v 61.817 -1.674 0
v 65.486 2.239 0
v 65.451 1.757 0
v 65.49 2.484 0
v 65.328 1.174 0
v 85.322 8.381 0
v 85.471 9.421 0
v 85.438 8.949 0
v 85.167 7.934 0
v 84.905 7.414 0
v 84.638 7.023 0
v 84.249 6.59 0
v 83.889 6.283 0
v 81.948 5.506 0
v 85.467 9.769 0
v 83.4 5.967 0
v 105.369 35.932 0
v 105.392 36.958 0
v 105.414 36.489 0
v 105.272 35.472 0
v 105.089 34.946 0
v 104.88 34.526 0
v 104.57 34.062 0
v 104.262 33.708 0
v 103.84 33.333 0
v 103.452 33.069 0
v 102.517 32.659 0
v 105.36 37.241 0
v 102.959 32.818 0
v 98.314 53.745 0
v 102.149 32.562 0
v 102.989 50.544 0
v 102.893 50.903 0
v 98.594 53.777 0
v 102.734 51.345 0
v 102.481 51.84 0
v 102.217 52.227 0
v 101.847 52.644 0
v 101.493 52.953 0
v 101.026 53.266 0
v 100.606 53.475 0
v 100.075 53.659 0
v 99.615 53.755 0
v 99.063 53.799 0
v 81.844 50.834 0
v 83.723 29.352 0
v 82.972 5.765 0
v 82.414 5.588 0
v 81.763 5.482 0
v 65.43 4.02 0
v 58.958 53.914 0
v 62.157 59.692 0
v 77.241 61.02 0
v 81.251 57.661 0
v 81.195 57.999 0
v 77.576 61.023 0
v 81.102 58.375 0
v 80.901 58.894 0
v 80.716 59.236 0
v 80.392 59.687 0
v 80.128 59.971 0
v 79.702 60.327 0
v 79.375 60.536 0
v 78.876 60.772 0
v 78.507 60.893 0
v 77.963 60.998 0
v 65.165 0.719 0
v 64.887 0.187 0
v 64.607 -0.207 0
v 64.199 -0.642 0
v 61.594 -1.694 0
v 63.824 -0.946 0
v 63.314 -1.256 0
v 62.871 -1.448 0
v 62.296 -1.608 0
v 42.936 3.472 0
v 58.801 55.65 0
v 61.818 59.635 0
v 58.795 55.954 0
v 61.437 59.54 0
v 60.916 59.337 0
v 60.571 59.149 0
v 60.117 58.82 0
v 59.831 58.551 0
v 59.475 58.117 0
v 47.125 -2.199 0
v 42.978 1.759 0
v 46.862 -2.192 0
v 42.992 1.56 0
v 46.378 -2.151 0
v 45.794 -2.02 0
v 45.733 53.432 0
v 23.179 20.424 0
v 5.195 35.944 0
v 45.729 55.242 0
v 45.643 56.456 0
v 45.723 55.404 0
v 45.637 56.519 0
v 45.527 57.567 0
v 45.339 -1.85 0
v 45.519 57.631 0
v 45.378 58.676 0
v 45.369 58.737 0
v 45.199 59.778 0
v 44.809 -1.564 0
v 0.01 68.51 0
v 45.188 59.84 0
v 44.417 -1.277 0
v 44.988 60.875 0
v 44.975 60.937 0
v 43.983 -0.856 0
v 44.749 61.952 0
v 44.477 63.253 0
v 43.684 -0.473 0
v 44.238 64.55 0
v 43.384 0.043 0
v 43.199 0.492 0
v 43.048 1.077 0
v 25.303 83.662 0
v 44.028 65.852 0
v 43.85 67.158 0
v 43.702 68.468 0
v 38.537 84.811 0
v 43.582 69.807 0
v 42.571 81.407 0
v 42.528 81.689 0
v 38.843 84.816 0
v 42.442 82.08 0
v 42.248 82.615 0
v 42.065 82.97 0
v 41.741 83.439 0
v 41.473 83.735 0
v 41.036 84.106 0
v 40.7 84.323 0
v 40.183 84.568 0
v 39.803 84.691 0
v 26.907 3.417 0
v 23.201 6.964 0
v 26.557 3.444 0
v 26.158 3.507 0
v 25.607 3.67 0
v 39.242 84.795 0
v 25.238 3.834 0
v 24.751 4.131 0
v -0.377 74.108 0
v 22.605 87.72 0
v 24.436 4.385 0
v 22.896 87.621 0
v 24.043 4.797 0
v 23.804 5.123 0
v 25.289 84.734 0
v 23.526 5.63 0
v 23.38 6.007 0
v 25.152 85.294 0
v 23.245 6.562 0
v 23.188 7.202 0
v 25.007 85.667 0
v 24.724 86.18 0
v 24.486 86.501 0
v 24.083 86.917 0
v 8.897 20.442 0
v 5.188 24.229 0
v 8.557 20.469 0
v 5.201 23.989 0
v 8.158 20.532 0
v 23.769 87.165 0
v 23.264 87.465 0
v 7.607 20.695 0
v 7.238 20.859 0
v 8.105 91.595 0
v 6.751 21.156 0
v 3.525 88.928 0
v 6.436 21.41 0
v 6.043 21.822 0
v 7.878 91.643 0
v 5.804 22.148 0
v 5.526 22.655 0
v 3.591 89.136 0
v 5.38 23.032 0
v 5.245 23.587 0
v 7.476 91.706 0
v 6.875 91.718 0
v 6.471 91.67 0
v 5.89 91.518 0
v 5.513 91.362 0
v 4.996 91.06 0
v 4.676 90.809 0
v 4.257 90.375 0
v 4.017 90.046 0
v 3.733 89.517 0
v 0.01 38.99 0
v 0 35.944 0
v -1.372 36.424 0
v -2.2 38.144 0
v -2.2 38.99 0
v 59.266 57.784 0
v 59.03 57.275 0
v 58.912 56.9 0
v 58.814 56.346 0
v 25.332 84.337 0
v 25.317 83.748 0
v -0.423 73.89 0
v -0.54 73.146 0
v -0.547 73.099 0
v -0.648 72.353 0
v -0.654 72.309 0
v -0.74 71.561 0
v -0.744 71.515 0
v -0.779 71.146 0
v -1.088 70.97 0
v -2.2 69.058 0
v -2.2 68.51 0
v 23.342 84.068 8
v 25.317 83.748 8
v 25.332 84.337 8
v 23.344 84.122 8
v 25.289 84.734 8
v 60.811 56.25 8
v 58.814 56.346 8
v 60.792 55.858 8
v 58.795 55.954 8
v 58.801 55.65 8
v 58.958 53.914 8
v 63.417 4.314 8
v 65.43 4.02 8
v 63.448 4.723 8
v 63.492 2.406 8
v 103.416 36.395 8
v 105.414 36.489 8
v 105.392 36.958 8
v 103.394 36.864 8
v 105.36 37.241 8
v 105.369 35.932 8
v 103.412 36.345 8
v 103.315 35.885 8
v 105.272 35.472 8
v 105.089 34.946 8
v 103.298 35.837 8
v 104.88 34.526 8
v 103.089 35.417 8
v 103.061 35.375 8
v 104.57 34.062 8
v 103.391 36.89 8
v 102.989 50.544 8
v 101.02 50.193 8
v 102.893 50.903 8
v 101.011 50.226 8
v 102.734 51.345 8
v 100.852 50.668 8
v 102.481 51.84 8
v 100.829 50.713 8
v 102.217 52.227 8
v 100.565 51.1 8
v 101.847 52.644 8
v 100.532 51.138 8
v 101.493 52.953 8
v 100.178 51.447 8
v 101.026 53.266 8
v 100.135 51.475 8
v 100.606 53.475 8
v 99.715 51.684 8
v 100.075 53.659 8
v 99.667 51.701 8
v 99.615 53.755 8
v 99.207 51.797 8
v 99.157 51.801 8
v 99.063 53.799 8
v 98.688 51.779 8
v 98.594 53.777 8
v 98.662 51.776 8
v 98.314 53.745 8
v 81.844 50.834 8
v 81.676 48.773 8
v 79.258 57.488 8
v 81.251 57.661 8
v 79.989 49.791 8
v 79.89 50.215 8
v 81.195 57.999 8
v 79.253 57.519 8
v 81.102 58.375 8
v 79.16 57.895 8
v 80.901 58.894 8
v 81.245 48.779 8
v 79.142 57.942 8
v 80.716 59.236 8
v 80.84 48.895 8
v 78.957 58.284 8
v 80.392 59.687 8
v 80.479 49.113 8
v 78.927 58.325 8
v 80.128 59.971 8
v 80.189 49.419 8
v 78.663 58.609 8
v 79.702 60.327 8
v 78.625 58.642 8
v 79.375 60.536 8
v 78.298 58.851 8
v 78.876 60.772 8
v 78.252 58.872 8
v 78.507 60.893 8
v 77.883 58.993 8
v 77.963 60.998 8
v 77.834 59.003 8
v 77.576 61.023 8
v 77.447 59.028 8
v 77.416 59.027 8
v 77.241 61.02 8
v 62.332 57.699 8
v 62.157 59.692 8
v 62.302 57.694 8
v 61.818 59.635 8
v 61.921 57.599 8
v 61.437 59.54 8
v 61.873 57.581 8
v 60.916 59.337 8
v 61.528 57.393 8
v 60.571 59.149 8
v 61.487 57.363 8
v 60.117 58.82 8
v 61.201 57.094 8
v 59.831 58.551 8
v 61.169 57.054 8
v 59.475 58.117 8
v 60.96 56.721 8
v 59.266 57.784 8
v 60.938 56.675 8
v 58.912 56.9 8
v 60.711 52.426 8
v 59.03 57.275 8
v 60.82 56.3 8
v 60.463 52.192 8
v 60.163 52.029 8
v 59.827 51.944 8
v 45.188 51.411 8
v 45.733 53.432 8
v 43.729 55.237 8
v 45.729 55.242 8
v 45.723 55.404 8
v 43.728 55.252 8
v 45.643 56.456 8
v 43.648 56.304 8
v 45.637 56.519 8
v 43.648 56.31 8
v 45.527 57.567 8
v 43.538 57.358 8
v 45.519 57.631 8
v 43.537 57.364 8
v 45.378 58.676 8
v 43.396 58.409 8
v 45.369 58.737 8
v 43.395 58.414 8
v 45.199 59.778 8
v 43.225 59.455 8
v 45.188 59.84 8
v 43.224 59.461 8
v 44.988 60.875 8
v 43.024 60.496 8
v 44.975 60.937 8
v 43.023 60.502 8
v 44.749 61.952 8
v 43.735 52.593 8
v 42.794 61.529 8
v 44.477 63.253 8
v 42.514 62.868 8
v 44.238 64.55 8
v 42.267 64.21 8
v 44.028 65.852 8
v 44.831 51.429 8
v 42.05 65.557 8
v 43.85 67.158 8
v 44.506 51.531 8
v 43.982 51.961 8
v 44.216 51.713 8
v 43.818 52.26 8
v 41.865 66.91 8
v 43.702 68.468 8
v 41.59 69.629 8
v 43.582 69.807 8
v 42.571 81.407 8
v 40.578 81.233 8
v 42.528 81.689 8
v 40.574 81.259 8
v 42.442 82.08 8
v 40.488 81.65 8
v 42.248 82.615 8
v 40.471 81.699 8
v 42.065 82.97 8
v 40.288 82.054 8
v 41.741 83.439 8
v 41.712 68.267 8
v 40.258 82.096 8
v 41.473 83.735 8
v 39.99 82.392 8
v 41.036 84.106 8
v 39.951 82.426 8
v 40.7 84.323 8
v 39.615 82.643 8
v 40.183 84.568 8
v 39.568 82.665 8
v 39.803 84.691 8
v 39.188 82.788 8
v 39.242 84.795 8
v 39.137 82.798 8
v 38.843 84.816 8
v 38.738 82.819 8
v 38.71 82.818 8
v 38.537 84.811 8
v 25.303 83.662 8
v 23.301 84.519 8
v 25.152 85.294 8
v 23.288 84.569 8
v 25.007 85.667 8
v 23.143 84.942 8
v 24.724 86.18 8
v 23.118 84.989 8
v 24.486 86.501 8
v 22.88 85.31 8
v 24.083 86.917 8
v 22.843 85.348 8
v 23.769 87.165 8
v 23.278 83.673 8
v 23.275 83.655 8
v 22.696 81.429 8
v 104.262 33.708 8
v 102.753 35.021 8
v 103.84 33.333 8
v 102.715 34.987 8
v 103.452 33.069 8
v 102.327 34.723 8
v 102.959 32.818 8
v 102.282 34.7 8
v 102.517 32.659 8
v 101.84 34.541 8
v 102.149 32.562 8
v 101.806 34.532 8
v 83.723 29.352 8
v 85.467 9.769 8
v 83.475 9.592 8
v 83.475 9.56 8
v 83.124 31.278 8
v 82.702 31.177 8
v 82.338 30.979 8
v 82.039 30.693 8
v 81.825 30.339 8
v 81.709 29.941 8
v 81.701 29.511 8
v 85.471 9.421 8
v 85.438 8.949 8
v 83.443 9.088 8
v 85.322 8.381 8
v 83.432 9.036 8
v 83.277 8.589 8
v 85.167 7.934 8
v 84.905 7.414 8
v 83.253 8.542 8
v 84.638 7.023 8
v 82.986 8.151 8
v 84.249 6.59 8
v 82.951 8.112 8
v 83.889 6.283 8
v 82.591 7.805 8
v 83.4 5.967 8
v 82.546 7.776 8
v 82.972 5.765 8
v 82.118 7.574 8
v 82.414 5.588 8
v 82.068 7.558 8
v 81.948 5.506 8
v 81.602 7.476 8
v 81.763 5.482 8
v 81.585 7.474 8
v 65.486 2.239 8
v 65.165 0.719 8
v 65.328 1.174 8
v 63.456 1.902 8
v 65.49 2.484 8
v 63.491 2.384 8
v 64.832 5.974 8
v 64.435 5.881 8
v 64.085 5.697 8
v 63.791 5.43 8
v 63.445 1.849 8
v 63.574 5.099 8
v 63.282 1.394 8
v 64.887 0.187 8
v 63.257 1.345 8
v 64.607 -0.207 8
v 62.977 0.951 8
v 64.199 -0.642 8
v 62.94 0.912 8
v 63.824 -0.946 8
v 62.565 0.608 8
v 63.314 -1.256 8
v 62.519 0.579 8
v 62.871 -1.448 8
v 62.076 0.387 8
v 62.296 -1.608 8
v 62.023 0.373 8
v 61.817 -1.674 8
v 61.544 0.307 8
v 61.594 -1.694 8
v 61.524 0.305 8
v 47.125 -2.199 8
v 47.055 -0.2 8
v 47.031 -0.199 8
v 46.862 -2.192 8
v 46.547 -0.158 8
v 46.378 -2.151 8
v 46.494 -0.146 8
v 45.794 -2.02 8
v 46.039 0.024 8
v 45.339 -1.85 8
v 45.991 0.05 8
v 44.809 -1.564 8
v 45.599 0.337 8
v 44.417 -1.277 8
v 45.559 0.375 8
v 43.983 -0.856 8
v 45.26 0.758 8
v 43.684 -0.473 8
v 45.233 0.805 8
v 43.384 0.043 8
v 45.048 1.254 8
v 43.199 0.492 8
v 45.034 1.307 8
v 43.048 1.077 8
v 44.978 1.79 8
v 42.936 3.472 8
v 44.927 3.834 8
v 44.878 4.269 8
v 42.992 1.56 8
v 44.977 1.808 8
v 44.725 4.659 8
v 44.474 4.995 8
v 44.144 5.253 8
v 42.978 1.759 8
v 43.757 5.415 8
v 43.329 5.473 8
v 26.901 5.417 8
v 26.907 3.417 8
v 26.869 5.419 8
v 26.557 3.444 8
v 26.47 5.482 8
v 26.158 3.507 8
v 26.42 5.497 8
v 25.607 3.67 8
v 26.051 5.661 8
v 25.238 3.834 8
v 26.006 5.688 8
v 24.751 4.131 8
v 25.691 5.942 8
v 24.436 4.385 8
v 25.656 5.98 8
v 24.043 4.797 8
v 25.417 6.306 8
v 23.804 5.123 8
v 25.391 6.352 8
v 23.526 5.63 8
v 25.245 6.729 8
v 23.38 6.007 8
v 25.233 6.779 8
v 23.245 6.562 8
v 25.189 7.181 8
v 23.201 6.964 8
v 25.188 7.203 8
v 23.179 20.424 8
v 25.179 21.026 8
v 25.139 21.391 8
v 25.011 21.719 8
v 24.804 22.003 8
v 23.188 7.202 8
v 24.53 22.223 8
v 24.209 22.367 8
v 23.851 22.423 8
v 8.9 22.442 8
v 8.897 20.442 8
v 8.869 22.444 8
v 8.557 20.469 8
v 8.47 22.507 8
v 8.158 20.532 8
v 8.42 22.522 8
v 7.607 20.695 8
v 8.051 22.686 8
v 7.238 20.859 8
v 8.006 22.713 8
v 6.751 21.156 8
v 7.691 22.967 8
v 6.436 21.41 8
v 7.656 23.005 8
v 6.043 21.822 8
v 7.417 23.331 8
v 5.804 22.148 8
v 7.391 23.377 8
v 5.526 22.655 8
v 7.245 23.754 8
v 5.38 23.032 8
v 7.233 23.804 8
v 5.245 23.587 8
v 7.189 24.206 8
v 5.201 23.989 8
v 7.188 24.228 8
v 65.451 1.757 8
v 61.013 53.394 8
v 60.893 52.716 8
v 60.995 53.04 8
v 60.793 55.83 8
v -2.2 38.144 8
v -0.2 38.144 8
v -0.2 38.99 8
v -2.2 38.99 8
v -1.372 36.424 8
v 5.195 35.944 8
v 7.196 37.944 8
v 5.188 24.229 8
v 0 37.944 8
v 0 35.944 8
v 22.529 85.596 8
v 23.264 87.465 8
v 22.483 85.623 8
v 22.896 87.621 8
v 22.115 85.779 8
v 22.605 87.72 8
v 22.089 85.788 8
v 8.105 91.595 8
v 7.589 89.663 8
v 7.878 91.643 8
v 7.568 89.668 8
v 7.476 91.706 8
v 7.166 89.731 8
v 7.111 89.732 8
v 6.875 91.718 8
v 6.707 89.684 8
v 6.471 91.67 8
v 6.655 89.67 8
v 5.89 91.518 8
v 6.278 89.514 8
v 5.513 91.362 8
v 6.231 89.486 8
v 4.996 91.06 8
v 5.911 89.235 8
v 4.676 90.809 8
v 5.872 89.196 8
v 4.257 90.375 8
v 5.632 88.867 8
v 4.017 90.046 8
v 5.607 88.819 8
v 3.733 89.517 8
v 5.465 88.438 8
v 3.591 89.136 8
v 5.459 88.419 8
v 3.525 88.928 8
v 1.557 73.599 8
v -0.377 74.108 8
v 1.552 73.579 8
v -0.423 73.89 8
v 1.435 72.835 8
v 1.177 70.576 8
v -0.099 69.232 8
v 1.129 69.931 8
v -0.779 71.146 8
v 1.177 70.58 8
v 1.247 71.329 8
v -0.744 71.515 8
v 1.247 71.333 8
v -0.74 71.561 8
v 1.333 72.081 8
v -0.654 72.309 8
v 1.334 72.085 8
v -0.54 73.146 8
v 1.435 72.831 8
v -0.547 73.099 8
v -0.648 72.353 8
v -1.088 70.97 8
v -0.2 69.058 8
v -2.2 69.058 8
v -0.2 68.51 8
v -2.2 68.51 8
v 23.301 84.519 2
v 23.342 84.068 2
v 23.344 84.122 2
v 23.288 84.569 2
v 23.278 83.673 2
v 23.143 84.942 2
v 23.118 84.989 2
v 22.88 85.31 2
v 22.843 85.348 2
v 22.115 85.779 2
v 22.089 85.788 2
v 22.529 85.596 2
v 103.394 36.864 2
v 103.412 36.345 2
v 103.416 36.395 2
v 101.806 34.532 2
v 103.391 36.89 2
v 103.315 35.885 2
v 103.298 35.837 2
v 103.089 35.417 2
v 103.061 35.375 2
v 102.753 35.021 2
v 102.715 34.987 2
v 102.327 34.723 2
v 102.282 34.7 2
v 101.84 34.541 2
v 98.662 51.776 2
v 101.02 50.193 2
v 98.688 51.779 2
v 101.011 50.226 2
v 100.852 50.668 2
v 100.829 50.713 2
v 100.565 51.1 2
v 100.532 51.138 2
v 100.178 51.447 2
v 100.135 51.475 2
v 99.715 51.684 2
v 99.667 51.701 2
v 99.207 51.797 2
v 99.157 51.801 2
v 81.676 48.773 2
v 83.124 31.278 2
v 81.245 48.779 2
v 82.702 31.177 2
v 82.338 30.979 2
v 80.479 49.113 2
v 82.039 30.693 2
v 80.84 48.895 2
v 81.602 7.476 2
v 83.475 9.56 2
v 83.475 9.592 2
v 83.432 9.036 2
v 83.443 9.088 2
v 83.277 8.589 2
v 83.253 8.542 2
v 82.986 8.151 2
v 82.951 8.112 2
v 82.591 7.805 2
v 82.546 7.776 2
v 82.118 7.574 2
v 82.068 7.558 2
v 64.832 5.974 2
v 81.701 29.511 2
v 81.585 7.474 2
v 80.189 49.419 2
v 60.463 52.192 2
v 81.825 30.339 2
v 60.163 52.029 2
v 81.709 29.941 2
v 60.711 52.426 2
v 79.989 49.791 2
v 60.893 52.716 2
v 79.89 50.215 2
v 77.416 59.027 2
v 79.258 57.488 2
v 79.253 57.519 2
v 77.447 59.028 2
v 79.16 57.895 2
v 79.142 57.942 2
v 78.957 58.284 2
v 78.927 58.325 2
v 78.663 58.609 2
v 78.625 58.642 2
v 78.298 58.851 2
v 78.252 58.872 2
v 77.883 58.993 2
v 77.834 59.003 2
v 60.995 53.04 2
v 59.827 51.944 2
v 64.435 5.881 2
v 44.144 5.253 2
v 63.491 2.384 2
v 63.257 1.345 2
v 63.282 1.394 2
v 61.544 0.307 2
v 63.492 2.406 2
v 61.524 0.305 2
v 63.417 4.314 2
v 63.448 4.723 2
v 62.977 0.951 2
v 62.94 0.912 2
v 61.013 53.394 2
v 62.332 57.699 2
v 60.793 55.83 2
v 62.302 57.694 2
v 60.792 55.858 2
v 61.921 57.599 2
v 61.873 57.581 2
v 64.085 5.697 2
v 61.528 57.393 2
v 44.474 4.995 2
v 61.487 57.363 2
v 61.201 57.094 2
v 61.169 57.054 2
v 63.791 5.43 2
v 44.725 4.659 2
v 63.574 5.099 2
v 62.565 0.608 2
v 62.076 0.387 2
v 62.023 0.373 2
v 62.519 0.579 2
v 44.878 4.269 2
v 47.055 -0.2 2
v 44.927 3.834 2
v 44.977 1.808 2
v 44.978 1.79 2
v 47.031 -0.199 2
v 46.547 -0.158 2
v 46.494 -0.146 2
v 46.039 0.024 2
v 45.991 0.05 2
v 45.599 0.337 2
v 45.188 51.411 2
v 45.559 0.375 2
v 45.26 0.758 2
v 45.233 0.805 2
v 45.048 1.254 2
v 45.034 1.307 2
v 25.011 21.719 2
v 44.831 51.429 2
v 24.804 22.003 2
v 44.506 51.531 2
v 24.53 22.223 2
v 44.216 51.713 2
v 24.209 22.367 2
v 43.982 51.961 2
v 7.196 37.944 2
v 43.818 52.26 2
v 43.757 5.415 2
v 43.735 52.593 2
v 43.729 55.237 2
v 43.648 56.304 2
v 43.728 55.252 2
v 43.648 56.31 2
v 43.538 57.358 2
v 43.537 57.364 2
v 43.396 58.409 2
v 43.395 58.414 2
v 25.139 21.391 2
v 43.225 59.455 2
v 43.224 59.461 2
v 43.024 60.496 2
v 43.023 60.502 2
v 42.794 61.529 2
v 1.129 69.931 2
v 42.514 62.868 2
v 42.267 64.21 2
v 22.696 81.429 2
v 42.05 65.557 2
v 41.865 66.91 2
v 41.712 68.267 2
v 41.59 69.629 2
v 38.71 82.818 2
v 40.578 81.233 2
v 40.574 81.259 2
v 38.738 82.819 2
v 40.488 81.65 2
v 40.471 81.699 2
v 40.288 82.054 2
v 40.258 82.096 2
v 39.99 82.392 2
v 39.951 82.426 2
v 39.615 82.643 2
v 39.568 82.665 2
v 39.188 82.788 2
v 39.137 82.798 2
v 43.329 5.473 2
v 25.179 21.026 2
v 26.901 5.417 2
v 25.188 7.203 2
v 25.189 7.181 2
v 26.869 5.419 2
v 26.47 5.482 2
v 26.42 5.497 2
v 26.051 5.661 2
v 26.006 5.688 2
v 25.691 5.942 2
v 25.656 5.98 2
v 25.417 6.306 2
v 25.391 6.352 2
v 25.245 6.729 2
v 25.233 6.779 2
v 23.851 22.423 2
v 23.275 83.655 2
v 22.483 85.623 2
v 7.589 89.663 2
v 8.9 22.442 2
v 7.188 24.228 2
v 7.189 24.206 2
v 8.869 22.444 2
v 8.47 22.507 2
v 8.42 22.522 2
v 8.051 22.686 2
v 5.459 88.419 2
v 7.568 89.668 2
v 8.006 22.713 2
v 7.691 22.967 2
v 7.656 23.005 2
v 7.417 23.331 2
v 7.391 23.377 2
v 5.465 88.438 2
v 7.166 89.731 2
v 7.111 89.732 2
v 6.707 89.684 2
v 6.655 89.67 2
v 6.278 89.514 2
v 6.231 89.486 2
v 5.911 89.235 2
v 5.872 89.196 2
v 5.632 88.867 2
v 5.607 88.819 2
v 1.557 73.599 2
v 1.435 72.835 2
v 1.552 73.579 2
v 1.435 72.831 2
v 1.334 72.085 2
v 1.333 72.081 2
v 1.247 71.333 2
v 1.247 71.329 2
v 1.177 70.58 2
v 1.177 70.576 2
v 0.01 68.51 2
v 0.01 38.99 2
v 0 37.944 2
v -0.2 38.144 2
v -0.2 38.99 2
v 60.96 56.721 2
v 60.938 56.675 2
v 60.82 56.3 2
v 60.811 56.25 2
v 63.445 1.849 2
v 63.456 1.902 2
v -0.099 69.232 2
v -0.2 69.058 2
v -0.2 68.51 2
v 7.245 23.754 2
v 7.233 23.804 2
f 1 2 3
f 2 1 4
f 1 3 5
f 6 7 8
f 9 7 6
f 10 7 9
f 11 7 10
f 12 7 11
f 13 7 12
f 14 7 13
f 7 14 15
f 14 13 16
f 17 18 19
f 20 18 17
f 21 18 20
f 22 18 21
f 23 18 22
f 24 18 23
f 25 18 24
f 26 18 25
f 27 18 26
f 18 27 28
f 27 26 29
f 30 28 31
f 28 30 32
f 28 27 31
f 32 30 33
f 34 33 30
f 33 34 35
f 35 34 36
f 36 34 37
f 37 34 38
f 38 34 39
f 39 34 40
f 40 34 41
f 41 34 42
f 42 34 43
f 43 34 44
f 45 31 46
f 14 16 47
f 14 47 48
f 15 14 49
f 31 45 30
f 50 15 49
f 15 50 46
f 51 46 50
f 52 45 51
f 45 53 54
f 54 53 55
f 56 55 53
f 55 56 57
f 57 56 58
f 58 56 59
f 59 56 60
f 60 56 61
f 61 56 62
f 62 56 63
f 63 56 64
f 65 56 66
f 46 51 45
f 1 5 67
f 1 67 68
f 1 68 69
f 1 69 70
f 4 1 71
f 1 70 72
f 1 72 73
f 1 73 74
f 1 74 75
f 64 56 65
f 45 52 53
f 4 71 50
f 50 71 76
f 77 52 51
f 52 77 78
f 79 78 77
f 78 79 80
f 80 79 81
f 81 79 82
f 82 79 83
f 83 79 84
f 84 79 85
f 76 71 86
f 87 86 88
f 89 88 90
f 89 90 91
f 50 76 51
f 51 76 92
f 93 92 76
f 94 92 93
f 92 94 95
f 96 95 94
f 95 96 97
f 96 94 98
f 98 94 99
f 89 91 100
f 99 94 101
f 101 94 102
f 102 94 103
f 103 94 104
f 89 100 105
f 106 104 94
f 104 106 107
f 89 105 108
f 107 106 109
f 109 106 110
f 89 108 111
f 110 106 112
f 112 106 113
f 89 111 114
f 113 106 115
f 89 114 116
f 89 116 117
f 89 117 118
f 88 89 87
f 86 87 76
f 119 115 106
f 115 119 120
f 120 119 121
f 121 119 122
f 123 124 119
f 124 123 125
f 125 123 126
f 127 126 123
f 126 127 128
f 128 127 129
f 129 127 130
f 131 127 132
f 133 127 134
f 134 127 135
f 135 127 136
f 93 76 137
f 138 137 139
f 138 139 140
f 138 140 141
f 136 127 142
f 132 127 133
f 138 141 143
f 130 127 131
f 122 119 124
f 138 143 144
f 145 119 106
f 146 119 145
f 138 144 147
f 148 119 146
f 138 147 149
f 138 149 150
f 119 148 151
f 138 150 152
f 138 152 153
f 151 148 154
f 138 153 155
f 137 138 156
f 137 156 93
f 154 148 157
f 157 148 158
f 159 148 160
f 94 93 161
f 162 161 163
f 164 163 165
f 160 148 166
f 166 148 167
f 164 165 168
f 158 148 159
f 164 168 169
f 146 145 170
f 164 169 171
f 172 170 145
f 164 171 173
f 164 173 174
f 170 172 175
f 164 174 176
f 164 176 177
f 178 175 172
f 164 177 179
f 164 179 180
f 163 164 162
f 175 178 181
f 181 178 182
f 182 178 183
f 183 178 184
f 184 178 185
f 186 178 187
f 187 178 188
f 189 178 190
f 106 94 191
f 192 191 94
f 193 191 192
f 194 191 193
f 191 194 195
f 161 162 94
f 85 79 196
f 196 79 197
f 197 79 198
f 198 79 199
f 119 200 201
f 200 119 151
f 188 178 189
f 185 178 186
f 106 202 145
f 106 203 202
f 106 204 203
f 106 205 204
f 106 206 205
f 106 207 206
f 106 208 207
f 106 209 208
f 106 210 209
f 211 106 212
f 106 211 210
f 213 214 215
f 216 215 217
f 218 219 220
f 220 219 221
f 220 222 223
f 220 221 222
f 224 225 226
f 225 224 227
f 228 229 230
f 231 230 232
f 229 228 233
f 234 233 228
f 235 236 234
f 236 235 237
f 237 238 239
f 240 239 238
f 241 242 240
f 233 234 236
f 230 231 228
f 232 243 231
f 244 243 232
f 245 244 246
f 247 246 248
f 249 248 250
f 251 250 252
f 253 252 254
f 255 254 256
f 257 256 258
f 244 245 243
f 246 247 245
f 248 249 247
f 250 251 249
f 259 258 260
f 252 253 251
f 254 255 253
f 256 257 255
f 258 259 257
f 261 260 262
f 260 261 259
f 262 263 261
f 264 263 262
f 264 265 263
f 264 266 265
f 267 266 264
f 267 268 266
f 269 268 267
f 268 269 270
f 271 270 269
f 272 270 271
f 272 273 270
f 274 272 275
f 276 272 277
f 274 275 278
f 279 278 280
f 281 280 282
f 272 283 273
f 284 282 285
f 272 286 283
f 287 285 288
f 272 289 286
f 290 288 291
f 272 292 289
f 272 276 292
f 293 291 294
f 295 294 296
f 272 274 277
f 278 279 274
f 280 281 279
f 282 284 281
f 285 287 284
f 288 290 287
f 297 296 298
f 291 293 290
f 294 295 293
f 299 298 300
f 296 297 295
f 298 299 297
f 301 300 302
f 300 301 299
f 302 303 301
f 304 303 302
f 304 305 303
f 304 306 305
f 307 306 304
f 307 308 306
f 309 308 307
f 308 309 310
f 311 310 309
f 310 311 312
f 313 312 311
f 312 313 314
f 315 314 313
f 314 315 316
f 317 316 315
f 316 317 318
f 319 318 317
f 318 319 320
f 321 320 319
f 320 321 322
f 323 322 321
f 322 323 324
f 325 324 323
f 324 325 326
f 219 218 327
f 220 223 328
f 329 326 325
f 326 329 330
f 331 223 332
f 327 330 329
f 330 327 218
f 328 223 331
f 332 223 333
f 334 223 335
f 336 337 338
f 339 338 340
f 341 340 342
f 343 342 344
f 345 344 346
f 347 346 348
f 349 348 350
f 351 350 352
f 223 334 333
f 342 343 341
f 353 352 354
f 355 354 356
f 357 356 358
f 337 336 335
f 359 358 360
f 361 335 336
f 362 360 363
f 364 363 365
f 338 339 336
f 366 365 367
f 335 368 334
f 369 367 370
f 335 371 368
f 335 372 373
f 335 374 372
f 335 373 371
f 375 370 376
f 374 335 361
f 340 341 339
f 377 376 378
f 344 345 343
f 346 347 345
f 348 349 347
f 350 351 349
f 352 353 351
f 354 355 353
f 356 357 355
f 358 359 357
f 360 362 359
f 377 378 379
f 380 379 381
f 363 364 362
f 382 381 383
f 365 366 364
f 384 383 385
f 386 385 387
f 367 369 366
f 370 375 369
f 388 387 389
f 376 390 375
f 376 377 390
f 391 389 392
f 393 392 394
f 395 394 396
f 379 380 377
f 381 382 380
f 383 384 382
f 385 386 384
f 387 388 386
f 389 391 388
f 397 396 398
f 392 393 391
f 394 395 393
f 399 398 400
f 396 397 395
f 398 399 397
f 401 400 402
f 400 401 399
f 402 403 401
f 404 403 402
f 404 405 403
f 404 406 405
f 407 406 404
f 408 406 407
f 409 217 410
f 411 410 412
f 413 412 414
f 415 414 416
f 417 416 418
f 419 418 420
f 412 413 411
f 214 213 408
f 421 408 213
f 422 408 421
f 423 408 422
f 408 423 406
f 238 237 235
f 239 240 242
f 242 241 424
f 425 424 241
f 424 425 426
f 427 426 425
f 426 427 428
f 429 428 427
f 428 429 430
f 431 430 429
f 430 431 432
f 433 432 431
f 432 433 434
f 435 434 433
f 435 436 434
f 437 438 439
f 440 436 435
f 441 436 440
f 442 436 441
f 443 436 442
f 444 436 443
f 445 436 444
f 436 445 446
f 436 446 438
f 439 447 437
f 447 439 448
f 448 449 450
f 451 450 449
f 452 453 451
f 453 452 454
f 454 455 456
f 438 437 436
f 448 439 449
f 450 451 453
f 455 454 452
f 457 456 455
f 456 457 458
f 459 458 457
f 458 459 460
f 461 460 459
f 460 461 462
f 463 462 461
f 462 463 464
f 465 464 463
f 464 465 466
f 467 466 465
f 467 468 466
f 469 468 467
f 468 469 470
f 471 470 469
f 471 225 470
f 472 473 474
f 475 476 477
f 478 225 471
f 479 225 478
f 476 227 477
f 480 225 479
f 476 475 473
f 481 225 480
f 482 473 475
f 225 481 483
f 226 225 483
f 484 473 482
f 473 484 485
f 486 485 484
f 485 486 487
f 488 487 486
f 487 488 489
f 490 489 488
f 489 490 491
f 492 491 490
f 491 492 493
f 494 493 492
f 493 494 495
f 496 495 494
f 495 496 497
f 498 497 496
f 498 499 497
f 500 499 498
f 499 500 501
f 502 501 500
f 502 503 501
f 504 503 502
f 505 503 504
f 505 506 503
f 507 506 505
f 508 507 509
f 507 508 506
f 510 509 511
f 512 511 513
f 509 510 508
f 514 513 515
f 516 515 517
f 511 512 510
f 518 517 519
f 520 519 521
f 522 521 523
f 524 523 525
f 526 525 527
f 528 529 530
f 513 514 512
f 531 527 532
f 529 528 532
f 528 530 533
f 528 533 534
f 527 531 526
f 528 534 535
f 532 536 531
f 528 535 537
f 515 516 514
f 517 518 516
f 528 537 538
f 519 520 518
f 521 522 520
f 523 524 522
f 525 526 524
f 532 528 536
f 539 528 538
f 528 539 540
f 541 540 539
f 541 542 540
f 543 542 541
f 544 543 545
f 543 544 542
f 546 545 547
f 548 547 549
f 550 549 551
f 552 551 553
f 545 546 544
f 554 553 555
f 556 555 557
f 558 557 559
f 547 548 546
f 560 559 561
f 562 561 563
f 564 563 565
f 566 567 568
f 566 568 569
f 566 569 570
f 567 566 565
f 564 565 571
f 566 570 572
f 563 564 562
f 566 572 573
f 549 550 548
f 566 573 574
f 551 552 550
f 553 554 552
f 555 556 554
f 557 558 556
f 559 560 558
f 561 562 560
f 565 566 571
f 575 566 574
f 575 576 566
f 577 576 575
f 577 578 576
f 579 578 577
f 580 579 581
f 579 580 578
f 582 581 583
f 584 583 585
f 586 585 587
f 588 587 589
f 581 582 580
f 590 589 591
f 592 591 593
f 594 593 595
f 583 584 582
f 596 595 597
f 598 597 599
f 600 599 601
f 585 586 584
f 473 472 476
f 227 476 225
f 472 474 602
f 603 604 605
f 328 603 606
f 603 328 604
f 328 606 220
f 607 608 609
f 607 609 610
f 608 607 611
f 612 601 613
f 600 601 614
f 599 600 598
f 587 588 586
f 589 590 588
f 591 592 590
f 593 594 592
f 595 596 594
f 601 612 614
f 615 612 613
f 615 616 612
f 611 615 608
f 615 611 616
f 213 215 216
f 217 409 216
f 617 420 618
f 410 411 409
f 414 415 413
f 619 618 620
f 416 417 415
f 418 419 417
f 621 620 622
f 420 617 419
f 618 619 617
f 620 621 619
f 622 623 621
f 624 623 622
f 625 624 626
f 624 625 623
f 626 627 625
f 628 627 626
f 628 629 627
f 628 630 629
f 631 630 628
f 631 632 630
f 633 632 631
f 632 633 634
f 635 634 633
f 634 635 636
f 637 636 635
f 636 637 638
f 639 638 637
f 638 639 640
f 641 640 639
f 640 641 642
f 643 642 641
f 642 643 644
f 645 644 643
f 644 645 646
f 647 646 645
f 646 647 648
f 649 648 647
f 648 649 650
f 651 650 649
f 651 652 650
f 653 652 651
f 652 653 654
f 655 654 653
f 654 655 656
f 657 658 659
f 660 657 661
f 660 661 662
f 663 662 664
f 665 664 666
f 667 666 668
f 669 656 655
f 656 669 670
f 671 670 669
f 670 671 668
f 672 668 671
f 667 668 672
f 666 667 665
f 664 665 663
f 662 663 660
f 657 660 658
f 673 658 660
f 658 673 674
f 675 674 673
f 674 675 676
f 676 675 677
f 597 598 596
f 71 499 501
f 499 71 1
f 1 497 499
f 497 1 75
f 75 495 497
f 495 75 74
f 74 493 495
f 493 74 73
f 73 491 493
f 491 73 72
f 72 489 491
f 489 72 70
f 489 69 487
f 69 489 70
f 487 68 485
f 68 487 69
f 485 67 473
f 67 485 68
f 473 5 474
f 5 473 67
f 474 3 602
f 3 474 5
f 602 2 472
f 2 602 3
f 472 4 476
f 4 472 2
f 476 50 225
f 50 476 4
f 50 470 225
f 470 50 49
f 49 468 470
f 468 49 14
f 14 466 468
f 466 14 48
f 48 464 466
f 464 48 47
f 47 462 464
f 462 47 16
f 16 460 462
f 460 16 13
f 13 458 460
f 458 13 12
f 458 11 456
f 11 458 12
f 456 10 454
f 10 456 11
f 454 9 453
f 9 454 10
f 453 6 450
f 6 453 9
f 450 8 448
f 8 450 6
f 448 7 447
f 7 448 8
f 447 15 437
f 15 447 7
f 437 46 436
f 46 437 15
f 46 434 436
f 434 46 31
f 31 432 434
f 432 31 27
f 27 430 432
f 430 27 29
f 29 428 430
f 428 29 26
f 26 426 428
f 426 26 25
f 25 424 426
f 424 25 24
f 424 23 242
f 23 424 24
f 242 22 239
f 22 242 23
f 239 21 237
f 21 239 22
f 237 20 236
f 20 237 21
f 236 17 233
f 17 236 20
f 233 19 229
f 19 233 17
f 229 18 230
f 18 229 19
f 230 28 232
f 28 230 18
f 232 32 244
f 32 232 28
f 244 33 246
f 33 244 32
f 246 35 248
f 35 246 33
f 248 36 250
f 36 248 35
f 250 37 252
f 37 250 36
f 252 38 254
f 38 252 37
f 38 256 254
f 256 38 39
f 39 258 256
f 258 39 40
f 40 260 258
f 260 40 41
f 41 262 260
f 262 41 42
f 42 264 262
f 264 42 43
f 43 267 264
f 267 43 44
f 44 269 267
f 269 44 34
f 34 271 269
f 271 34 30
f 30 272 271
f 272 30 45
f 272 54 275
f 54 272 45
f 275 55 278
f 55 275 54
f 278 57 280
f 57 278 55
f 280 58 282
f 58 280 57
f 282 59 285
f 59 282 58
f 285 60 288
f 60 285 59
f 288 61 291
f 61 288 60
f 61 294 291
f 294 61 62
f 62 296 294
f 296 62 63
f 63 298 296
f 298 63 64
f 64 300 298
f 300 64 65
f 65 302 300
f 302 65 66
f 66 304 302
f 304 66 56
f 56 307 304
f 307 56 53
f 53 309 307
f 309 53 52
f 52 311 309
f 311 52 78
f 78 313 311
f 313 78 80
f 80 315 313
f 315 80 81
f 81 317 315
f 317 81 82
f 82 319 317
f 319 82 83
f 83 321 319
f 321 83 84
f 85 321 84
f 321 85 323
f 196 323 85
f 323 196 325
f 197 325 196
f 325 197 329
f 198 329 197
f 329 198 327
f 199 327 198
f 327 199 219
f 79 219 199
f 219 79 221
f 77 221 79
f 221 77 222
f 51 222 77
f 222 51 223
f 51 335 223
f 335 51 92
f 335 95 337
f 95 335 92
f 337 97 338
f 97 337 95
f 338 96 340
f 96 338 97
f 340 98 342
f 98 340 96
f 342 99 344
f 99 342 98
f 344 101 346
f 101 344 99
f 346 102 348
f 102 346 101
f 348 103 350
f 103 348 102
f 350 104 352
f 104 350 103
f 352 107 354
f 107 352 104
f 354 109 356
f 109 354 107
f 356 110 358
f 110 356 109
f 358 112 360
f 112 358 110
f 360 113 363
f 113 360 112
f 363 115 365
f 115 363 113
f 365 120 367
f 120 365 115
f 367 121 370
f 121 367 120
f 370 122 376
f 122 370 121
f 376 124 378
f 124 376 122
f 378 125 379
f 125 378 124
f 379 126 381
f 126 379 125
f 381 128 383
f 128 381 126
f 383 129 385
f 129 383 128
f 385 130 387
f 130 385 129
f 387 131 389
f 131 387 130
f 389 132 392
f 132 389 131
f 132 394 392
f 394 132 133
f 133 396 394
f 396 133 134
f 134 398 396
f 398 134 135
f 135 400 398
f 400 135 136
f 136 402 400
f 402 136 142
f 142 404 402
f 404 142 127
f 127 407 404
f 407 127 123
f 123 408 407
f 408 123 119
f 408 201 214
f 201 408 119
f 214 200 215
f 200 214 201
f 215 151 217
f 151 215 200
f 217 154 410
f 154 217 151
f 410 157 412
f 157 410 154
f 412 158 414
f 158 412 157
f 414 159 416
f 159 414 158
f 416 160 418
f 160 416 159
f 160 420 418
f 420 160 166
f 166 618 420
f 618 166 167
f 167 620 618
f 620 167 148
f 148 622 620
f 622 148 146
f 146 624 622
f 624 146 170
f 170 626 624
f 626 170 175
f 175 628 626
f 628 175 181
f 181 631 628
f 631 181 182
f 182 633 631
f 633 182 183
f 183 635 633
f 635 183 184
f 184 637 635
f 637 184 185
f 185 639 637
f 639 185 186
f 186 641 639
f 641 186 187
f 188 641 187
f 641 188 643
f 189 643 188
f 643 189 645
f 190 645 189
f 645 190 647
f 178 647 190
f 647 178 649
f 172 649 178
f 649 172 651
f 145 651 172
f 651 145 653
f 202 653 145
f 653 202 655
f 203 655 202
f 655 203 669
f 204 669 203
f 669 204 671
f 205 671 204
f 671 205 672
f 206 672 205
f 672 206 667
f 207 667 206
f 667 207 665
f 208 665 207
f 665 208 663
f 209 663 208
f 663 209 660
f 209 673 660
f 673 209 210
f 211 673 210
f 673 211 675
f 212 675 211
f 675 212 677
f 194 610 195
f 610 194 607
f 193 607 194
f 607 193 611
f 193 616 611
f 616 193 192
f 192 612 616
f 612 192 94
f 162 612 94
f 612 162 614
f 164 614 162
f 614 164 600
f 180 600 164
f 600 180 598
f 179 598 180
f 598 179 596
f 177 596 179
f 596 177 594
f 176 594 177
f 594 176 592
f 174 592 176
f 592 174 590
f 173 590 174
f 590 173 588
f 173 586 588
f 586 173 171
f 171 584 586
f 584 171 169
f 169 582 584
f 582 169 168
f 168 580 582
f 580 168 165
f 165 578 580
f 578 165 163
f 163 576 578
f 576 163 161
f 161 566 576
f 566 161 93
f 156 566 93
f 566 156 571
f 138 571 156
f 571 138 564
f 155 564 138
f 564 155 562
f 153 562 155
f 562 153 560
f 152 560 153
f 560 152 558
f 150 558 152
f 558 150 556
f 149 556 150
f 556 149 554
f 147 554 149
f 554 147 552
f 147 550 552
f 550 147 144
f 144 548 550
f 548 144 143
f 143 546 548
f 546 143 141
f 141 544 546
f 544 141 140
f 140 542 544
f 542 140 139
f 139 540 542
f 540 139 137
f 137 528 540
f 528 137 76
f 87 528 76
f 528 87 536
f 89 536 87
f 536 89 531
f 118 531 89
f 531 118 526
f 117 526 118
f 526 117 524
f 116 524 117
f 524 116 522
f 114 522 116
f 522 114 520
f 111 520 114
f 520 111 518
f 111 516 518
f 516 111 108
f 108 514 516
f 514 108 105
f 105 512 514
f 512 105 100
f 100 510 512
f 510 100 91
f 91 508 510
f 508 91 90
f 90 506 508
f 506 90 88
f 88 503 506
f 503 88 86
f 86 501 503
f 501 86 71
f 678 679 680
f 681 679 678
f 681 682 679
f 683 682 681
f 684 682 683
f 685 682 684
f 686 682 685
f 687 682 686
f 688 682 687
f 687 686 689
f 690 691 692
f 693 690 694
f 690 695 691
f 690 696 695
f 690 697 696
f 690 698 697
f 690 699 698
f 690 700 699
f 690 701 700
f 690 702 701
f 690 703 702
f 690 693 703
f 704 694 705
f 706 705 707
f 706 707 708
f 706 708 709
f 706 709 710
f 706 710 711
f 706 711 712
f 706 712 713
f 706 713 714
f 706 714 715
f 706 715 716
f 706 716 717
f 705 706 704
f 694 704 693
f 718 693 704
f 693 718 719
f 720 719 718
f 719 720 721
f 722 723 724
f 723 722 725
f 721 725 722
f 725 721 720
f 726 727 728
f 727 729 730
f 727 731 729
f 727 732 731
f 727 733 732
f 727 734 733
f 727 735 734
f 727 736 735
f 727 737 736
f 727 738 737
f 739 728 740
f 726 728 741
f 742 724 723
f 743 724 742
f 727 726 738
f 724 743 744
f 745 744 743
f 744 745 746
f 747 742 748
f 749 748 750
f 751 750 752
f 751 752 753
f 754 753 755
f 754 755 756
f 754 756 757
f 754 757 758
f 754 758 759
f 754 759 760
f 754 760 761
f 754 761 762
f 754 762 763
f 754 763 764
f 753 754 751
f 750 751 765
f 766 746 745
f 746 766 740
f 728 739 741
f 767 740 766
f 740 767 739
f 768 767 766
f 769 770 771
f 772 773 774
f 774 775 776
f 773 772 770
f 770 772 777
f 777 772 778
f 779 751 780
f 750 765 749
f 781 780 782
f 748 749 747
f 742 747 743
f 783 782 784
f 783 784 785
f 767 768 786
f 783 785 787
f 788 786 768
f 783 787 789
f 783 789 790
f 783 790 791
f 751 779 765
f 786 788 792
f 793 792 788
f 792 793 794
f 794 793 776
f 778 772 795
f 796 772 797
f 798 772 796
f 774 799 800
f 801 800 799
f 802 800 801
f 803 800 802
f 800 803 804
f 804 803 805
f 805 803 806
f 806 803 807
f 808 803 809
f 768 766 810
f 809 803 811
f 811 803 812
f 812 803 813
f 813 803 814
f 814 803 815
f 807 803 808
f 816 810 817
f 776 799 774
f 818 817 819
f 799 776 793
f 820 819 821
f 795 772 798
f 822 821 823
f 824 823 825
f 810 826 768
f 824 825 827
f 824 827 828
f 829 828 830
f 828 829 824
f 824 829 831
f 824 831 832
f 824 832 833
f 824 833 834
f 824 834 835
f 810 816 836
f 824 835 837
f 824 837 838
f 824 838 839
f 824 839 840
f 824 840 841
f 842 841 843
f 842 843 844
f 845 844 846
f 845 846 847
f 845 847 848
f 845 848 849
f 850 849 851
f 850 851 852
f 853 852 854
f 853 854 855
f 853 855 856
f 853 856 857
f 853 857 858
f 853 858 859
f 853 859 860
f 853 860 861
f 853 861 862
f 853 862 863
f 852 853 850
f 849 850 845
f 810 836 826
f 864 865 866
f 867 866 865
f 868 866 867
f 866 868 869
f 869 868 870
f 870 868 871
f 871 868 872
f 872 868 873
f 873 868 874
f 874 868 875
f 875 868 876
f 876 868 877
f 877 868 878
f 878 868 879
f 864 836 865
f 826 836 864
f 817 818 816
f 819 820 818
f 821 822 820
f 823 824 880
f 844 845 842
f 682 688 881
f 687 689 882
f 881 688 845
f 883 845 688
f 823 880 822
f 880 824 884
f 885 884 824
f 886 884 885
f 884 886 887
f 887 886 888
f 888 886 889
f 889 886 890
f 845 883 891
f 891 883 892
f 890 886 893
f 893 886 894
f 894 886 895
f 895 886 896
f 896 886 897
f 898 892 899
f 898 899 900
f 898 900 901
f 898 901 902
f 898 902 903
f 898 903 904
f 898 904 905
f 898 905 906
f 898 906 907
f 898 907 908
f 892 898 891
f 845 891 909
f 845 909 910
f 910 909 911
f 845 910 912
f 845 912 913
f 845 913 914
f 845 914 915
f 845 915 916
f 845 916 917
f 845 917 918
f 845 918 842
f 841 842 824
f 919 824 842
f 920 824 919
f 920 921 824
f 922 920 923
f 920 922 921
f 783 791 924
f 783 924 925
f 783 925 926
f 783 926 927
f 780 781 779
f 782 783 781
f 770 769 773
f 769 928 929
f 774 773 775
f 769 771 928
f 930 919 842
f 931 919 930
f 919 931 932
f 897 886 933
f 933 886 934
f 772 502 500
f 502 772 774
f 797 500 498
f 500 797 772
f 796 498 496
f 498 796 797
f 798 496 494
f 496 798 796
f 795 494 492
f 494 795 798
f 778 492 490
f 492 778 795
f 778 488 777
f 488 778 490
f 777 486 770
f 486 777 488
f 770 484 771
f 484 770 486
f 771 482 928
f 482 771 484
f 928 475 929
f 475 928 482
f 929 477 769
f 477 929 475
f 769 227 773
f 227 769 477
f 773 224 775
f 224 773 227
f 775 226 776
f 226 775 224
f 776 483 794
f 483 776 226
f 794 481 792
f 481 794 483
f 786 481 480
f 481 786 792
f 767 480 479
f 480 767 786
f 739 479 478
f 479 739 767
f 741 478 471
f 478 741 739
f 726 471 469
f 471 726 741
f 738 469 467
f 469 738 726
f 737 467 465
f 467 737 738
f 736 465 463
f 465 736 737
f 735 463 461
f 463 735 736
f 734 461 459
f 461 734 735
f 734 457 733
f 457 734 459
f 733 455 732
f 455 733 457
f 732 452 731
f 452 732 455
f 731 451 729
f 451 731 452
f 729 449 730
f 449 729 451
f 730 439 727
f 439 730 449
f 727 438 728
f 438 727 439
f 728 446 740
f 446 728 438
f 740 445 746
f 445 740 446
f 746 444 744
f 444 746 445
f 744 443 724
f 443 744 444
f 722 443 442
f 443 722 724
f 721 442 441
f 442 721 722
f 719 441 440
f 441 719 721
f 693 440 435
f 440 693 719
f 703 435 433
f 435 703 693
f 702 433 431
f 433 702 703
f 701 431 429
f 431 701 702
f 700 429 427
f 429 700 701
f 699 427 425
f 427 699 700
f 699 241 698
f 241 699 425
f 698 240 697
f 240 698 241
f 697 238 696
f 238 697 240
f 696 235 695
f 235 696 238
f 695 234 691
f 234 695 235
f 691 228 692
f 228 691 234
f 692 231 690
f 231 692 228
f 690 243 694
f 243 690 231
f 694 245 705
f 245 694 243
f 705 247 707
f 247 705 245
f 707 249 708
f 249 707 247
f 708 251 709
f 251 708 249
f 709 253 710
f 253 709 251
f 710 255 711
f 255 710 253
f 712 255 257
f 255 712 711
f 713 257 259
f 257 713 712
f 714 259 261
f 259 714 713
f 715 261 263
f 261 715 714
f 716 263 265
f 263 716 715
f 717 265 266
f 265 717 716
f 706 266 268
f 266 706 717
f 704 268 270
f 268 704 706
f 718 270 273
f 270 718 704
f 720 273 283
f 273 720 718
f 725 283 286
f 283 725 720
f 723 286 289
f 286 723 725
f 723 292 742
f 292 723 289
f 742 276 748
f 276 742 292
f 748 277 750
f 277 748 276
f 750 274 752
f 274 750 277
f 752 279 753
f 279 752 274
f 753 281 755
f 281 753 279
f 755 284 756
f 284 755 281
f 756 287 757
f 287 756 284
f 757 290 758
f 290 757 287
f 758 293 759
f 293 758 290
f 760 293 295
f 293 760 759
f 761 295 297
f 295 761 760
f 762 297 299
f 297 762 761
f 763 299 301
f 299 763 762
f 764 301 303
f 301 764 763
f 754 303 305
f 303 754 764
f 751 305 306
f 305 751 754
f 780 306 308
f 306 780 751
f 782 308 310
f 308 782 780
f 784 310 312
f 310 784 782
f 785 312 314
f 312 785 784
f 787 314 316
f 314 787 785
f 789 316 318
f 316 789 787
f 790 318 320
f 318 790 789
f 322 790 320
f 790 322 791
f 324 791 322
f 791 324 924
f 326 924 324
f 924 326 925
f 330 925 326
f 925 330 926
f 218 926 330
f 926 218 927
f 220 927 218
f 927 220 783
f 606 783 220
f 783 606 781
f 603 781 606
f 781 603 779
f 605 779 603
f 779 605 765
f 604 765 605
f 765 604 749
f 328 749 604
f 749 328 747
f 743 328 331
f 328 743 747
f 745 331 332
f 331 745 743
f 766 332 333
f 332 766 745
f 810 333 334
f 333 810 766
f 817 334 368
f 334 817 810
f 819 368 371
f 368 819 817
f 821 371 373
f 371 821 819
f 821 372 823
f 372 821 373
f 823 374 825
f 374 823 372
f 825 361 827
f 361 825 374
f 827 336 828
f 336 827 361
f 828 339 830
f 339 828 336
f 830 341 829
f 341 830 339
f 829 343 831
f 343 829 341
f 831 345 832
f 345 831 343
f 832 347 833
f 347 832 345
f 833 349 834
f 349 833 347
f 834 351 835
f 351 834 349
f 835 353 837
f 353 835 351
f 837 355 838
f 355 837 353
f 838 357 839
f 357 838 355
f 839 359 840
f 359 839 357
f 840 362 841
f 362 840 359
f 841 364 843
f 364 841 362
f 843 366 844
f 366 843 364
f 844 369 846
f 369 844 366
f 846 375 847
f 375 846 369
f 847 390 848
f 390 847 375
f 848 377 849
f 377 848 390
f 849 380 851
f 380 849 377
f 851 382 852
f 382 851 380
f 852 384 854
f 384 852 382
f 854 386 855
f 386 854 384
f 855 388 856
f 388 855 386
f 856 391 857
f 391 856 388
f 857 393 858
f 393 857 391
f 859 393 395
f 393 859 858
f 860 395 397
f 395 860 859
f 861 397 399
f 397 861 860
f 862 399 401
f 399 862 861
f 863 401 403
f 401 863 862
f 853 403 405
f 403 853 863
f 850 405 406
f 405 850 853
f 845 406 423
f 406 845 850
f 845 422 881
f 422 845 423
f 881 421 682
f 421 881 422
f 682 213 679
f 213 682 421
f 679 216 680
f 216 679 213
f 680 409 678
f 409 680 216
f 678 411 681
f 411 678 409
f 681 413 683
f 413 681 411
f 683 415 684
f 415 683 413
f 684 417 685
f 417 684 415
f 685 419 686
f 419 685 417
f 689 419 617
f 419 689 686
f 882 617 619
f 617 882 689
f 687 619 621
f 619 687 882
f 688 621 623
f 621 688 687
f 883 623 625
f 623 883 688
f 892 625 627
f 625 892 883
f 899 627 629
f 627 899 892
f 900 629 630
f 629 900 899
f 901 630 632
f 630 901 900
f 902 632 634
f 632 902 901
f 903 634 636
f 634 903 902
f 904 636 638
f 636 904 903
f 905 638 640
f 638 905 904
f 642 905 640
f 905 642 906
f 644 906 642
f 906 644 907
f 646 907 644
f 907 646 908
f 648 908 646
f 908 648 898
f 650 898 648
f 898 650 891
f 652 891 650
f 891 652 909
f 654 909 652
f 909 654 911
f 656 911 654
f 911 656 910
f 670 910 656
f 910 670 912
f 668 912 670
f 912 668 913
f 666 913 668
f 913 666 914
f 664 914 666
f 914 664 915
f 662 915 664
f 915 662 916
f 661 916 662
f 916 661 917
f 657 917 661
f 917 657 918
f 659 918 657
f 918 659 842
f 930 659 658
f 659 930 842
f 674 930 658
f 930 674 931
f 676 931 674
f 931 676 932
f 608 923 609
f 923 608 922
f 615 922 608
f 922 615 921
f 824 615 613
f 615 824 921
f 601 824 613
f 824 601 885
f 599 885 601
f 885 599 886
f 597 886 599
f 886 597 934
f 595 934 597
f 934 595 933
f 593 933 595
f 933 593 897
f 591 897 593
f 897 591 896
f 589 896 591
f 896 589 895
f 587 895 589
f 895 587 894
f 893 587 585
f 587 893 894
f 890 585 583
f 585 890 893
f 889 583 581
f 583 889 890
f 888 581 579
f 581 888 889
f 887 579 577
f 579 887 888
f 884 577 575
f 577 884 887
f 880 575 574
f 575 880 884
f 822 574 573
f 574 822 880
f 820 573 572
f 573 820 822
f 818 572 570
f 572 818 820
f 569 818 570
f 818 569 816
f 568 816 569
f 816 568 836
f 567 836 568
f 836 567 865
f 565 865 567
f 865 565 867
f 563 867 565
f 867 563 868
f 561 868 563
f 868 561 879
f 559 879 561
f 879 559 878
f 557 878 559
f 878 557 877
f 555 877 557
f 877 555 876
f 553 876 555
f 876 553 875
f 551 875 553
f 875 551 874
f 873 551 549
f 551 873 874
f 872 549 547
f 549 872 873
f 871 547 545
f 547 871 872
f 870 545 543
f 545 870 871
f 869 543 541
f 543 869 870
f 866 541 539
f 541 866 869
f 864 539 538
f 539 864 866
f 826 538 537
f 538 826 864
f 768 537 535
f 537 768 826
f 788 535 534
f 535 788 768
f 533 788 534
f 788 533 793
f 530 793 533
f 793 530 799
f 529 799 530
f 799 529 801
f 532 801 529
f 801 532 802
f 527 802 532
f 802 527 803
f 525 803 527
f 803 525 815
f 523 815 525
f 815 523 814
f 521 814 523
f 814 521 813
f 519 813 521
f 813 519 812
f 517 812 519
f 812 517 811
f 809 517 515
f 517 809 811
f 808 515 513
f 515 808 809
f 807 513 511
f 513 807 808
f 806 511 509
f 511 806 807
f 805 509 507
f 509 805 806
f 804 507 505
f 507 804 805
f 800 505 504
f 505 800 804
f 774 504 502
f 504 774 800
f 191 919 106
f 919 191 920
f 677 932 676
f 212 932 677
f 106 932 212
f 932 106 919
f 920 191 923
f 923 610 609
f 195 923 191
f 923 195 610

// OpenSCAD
// file: ../common.scad
// Smallcat Keyboard Case - Common Parameters and Modules
// Shared code for all case variants

// Parameters
wall_thickness = 2;        // Wall thickness in mm
case_depth = 8;            // Total case depth in mm
pcb_thickness = 1.6;       // PCB thickness in mm
pcb_clearance = 0.2;       // Clearance around PCB in mm
bottom_thickness = 2;      // Bottom plate thickness in mm

// Main case module - takes PCB outline, cutout passed as children()
module case_bottom(pcb_outline) {
    difference() {
        // Outer shell
        linear_extrude(height=case_depth)
            offset(r=wall_thickness + pcb_clearance)
                polygon(pcb_outline);

        // Inner cavity for PCB
        translate([0, 0, bottom_thickness])
            linear_extrude(height=case_depth)
                offset(r=pcb_clearance)
                    polygon(pcb_outline);

        // Cutout geometry passed as children
        children();
    }
}
// file: common.scad
// Smallcat Split Keyboard Case - Common Parameters and Modules
// Shared code for split case variants

include <../common.scad>

// Connector edge cutout parameters
connector_cutout_start = 39;   // Y start position
connector_cutout_end = 68.5;   // Y end position

// PCB dimensions
pcb_max_x = 103.216;

// Mirror points across X axis
function mirror_x(points, max_x) = [for (p = points) [max_x - p[0], p[1]]];

// Left half PCB outline (right half is mirrored from this)
left_pcb_outline = [
    [103.194, 36.855],
    [103.216, 36.386],
    [103.119, 35.926],
    [102.910, 35.506],
    [102.602, 35.152],
    [102.214, 34.888],
    [101.772, 34.729],
    [83.084, 31.474],
    [82.630, 31.365],
    [82.219, 31.142],
    [81.882, 30.819],
    [81.640, 30.420],
    [81.510, 29.971],
    [81.501, 29.504],
    [83.276, 9.574],
    [83.243, 9.102],
    [83.088, 8.655],
    [82.821, 8.264],
    [82.461, 7.957],
    [82.033, 7.755],
    [81.567, 7.673],
    [64.800, 6.172],
    [64.365, 6.070],
    [63.969, 5.862],
    [63.638, 5.561],
    [63.393, 5.187],
    [63.250, 4.763],
    [63.217, 4.317],
    [63.292, 2.398],
    [63.257, 1.916],
    [63.094, 1.461],
    [62.814, 1.067],
    [62.439, 0.763],
    [61.996, 0.571],
    [61.517, 0.505],
    [47.048, 0.000],
    [46.564, 0.041],
    [46.109, 0.211],
    [45.717, 0.498],
    [45.418, 0.881],
    [45.233, 1.330],
    [45.177, 1.813],
    [45.127, 3.848],
    [45.074, 4.318],
    [44.901, 4.757],
    [44.618, 5.136],
    [44.246, 5.427],
    [43.810, 5.610],
    [43.342, 5.673],
    [26.900, 5.617],
    [26.501, 5.680],
    [26.132, 5.844],
    [25.817, 6.098],
    [25.578, 6.424],
    [25.432, 6.801],
    [25.388, 7.203],
    [25.379, 21.037],
    [25.335, 21.439],
    [25.188, 21.816],
    [24.950, 22.142],
    [24.635, 22.395],
    [24.266, 22.560],
    [23.867, 22.623],
    [8.900, 22.642],
    [8.501, 22.705],
    [8.132, 22.869],
    [7.817, 23.123],
    [7.578, 23.449],
    [7.432, 23.826],
    [7.388, 24.228],
    [7.396, 38.144],
    [0.000, 38.144],
    [0.000, 69.058],
    [1.321, 69.810],
    [1.376, 70.561],
    [1.446, 71.310],
    [1.532, 72.058],
    [1.633, 72.804],
    [1.750, 73.548],
    [5.652, 88.368],
    [5.794, 88.749],
    [6.034, 89.078],
    [6.354, 89.329],
    [6.731, 89.485],
    [7.135, 89.533],
    [7.537, 89.470],
    [22.037, 85.595],
    [22.405, 85.439],
    [22.719, 85.191],
    [22.957, 84.870],
    [23.102, 84.497],
    [23.145, 84.100],
    [23.081, 83.705],
    [22.431, 81.205],
    [38.727, 82.619],
    [39.126, 82.598],
    [39.506, 82.475],
    [39.842, 82.258],
    [40.110, 81.962],
    [40.293, 81.607],
    [40.379, 81.216],
    [41.391, 69.611],
    [41.513, 68.247],
    [41.667, 66.885],
    [41.852, 65.528],
    [42.070, 64.176],
    [42.318, 62.829],
    [42.598, 61.488],
    [42.828, 60.458],
    [43.028, 59.423],
    [43.198, 58.382],
    [43.339, 57.337],
    [43.449, 56.289],
    [43.529, 55.237],
    [43.535, 52.568],
    [43.630, 52.187],
    [43.819, 51.842],
    [44.088, 51.557],
    [44.421, 51.348],
    [44.795, 51.230],
    [45.187, 51.211],
    [59.855, 51.745],
    [60.236, 51.841],
    [60.581, 52.029],
    [60.867, 52.298],
    [61.076, 52.631],
    [61.194, 53.005],
    [61.213, 53.398],
    [60.992, 55.848],
    [61.011, 56.240],
    [61.129, 56.615],
    [61.338, 56.948],
    [61.624, 57.217],
    [61.969, 57.405],
    [62.350, 57.500],
    [77.434, 58.828],
    [77.821, 58.803],
    [78.190, 58.682],
    [78.517, 58.473],
    [78.781, 58.189],
    [78.966, 57.847],
    [79.059, 57.471],
    [79.692, 50.183],
    [79.800, 49.720],
    [80.025, 49.301],
    [80.352, 48.956],
    [80.759, 48.710],
    [81.216, 48.579],
    [81.692, 48.573],
    [98.697, 51.579],
    [99.166, 51.601],
    [99.626, 51.505],
    [100.046, 51.296],
    [100.400, 50.987],
    [100.664, 50.600],
    [100.823, 50.158]
];

// Connector edge cutout module (clears entire inner edge section for USB + TRRS)
// Removes both wall and base plate so the base stops before the border
module connector_cutout(x_pos) {
    e = 0.01;  // Epsilon to avoid coincident faces
    cutout_length = connector_cutout_end - connector_cutout_start;
    cutout_width = wall_thickness + pcb_clearance + 2.8;
    translate([x_pos, connector_cutout_start - e, -e])
        cube([cutout_width + e, cutout_length + 2*e, case_depth + 2*e]);
}
// main file
// Smallcat Split Keyboard Case - Left Half
// Tray-style case design

include <common.scad>

case_bottom(left_pcb_outline) {
    connector_cutout(-5);
}
